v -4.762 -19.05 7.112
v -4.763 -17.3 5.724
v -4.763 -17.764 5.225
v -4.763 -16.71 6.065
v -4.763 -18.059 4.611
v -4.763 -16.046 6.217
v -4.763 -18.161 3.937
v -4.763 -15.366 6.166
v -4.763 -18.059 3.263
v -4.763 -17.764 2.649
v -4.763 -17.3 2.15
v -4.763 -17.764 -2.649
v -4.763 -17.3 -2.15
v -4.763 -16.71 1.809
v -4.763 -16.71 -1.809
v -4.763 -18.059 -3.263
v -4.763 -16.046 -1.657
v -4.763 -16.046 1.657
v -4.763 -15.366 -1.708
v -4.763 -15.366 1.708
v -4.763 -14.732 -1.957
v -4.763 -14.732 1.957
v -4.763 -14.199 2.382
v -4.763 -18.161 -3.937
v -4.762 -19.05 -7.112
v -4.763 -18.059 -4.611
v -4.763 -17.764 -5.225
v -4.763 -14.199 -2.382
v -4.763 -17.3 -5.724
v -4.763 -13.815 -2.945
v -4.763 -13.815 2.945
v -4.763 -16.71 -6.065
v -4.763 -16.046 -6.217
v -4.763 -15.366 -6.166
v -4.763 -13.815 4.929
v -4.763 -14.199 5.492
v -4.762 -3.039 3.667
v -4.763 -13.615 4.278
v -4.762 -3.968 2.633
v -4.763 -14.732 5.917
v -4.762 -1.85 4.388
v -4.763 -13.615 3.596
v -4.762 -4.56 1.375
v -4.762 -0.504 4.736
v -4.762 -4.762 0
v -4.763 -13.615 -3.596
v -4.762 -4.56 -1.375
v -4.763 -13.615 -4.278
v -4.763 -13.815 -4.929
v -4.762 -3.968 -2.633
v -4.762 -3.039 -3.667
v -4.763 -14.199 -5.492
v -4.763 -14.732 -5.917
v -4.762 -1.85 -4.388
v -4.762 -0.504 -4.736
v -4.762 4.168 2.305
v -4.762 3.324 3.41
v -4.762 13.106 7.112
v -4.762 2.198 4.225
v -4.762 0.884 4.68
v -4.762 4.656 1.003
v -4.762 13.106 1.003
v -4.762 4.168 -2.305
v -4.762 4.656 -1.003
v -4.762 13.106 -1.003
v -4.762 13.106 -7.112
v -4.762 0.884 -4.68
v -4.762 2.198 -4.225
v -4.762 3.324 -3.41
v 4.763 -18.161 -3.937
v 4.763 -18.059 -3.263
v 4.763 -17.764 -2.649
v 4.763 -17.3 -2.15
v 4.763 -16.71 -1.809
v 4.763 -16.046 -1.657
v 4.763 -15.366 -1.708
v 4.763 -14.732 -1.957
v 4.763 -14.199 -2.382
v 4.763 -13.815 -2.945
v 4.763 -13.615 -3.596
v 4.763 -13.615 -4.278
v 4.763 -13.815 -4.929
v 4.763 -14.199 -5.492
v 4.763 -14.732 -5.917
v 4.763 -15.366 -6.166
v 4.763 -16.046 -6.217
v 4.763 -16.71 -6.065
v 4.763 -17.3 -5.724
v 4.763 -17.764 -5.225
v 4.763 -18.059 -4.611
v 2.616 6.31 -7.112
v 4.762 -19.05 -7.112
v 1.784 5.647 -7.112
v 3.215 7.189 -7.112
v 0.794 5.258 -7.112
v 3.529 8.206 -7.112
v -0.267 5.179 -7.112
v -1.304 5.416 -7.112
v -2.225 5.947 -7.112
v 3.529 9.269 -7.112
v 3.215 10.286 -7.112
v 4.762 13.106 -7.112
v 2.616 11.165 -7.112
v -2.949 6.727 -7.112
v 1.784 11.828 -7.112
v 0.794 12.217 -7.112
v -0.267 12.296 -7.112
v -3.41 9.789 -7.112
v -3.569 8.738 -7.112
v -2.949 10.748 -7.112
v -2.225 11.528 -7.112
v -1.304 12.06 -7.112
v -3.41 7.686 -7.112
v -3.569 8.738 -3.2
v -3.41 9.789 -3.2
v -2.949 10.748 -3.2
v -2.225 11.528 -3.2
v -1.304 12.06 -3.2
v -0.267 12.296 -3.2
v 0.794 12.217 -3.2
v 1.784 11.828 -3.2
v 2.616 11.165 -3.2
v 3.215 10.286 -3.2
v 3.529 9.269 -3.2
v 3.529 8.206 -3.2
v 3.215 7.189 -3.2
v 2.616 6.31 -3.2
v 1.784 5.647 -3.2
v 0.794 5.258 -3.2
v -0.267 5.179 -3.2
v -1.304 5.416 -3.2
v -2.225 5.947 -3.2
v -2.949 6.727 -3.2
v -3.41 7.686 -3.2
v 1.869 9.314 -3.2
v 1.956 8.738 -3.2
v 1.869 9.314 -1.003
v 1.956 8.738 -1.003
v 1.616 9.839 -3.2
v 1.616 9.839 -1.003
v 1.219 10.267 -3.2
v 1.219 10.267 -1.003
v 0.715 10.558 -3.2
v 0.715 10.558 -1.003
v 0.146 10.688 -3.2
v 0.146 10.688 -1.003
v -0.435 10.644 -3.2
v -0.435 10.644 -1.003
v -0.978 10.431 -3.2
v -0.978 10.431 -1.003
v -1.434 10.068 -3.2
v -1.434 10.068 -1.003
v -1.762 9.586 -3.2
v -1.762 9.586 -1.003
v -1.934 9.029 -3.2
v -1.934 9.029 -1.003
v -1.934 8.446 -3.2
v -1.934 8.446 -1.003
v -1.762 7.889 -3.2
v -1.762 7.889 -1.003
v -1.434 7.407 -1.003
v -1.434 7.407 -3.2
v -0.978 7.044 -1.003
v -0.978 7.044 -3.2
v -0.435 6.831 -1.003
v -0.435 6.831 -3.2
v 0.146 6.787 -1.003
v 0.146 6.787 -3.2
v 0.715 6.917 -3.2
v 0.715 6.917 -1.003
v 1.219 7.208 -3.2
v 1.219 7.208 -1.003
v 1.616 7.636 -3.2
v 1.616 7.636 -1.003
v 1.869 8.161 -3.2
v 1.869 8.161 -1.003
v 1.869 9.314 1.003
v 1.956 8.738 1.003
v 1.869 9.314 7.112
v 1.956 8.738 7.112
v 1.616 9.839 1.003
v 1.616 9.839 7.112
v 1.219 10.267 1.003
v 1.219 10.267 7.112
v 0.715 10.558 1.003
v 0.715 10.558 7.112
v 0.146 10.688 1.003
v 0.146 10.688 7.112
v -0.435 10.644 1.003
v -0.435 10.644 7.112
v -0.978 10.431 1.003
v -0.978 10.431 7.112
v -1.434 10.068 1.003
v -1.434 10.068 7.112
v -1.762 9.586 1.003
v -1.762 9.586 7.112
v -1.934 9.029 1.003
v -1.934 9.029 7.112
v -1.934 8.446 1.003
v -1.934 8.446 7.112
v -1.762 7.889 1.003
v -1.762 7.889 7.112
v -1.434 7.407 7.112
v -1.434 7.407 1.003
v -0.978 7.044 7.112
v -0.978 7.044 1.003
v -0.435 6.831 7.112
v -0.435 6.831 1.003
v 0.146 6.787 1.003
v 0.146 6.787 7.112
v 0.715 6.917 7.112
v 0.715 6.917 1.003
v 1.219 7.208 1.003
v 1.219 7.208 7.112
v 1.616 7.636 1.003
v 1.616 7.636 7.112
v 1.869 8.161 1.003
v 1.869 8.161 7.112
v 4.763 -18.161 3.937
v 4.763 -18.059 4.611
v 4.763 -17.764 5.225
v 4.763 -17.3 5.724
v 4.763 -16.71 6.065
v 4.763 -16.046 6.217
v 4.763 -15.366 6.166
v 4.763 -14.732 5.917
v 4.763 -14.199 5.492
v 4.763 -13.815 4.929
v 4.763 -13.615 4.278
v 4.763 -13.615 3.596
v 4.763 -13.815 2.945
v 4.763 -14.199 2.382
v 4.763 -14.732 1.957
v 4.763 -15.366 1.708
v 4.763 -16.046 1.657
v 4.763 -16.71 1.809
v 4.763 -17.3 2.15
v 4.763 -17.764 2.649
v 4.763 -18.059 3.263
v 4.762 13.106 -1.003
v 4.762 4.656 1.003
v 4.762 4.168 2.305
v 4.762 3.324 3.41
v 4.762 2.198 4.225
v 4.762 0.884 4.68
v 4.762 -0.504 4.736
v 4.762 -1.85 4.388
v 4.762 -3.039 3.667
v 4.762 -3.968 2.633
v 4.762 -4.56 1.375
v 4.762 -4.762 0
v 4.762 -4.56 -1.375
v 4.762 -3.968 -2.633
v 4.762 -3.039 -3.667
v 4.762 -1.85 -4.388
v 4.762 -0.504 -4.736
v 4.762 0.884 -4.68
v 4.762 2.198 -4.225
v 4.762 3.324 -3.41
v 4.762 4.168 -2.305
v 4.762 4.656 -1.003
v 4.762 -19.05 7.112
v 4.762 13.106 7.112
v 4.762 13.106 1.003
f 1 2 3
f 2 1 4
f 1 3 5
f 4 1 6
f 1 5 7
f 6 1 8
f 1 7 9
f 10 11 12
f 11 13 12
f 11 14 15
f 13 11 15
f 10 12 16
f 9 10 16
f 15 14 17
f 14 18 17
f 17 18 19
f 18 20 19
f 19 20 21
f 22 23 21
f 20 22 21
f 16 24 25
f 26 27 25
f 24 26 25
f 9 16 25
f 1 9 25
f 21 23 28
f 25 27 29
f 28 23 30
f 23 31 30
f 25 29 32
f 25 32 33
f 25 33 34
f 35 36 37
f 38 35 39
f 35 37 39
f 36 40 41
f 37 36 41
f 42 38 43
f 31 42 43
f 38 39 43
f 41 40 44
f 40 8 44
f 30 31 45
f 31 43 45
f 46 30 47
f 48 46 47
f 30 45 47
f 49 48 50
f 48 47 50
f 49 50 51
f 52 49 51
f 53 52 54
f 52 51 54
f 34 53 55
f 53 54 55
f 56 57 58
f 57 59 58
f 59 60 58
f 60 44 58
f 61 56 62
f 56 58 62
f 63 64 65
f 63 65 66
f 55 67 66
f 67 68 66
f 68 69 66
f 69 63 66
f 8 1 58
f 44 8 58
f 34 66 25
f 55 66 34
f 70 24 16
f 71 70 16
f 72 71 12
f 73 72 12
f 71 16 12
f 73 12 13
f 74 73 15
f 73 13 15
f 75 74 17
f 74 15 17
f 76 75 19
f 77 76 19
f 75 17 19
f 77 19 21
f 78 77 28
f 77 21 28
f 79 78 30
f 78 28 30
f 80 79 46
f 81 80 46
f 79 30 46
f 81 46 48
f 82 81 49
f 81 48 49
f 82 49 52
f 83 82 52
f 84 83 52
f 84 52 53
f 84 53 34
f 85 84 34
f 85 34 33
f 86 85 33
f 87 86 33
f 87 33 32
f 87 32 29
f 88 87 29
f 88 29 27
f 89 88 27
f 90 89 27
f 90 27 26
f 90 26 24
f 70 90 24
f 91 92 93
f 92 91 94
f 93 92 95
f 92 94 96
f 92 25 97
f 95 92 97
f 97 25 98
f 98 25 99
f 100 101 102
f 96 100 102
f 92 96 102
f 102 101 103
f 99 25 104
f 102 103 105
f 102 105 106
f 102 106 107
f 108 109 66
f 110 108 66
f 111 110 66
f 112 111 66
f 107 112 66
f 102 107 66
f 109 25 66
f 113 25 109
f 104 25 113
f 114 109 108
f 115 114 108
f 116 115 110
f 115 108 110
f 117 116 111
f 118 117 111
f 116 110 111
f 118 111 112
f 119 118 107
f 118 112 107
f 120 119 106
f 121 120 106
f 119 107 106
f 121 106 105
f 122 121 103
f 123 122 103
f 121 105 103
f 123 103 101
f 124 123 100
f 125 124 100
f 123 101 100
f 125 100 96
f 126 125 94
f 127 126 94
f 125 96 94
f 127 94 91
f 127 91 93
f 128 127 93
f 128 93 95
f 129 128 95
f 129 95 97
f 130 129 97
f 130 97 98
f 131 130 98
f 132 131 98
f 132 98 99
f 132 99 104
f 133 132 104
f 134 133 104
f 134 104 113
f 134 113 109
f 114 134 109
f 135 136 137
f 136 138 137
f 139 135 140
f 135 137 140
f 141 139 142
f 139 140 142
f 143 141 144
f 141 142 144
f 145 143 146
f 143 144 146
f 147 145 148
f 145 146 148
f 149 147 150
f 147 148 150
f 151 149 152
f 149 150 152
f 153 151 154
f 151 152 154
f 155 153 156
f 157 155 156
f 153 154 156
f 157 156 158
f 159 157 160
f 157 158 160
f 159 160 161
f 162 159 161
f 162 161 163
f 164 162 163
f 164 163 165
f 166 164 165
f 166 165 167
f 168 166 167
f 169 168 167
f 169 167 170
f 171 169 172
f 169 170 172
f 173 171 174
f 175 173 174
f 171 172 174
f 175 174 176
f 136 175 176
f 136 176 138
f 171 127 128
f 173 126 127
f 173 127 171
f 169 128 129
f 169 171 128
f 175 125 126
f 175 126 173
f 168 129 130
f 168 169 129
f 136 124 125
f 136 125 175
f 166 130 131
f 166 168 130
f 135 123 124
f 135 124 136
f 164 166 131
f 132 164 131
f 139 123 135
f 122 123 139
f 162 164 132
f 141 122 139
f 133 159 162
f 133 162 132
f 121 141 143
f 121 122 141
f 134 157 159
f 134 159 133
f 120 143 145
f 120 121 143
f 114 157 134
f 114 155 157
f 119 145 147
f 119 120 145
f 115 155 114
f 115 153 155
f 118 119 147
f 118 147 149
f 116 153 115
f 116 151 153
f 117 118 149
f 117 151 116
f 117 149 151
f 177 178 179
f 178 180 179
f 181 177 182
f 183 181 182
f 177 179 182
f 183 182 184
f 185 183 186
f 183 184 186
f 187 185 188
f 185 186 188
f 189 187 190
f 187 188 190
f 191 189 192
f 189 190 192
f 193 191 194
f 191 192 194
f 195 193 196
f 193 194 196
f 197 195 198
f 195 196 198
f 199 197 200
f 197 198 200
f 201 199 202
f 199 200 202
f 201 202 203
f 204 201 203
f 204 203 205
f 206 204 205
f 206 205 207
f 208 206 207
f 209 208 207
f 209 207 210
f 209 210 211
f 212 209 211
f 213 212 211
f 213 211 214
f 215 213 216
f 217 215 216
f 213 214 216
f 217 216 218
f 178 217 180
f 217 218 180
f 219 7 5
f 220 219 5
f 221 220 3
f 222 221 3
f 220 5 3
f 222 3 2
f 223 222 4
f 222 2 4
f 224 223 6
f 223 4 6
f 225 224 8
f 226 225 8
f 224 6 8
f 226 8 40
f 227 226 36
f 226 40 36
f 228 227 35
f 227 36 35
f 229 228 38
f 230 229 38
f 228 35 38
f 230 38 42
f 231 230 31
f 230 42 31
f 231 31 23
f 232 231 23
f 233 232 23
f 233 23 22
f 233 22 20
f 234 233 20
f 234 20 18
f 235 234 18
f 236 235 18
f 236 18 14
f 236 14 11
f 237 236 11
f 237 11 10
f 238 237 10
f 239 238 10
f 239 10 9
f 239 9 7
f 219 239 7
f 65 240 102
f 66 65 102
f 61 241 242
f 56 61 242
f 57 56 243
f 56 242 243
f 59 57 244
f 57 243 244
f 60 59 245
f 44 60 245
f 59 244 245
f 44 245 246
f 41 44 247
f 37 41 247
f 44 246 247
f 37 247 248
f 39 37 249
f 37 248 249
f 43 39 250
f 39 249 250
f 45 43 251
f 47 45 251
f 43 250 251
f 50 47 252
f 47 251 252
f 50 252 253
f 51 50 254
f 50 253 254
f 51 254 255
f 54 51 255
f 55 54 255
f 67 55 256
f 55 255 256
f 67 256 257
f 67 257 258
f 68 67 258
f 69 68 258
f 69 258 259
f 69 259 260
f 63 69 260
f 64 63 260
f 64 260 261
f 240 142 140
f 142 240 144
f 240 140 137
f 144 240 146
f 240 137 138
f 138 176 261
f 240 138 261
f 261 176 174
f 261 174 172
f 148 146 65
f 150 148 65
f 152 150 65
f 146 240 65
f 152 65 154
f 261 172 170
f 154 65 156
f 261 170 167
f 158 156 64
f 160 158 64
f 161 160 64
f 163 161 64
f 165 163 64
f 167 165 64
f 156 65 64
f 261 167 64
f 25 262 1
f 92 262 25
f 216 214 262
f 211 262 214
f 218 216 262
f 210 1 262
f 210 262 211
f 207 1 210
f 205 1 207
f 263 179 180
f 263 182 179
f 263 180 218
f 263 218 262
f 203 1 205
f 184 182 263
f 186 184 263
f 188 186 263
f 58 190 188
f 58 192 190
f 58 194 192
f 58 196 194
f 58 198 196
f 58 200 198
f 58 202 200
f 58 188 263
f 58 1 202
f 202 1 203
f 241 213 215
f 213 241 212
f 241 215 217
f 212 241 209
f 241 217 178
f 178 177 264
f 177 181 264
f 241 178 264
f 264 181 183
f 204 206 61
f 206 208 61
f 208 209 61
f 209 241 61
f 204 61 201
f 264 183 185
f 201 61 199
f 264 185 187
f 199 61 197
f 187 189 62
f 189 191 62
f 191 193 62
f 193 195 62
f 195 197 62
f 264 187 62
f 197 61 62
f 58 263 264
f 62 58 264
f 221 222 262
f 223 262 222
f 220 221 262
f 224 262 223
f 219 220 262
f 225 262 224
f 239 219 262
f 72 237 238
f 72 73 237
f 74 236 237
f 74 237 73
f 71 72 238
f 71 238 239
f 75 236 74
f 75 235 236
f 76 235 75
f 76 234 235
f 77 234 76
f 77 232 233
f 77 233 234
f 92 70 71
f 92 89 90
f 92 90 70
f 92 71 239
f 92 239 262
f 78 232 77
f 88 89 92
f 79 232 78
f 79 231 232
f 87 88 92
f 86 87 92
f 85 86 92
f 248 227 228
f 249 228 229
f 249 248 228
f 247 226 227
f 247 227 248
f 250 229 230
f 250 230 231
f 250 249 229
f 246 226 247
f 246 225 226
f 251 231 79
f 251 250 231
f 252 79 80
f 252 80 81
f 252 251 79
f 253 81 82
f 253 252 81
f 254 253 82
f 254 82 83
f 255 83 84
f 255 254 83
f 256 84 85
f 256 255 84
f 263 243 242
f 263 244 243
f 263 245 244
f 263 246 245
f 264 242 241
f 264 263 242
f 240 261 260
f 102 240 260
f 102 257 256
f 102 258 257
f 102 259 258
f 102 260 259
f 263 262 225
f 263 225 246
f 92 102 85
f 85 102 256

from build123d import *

# Parameters (mm, degrees)
SKETCH1_W                                          = 31.75
SKETCH1_H                                          = 32.1564
BOSS_EXTRUDE1_DEPTH                                = 9.525
SKETCH2_W                                          = 8.763
SKETCH2_H                                          = 32.1564
CUT_EXTRUDE1_DEPTH                                 = 27.563955842
CUT_EXTRUDE2_DEPTH                                 = 27.563955842
SKETCH4_W                                          = 8.763
SKETCH4_H                                          = 32.16
CUT_EXTRUDE3_DEPTH                                 = 27.563955842
SKETCH5_W                                          = 9.525
SKETCH5_H                                          = 4.7625
SKETCH6_W                                          = 1.3208
SKETCH6_H                                          = 6.1087
CBORE_FOR_M3_5_HEX_HEAD_MACHINE_SCREW1_D           = 3.9116
CBORE_FOR_M3_5_HEX_HEAD_MACHINE_SCREW1_DEPTH       = 14.224
CBORE_FOR_M3_5_HEX_HEAD_MACHINE_SCREW1_CBORE_D     = 7.1374
CBORE_FOR_M3_5_HEX_HEAD_MACHINE_SCREW1_CBORE_DEPTH = 3.9116
M4_CLEARANCE_HOLE1_D                               = 4.572


with BuildPart() as part:
    # Sketch1 → Boss-Extrude1 (new body)
    with BuildSketch(Plane(origin=(4.7625, 0, 0), x_dir=(0, 0, -1), z_dir=(1, 0, 0))):
        with Locations((0, -2.9718)):
            Rectangle(SKETCH1_W, SKETCH1_H)
    extrude(amount=-BOSS_EXTRUDE1_DEPTH)

    # Sketch2 → Cut-Extrude1 (cut, through all)
    with BuildSketch(Plane.ZY.offset(4.7625)):
        with Locations((-11.4935, -2.9718)):
            Rectangle(SKETCH2_W, SKETCH2_H)
    extrude(amount=-CUT_EXTRUDE1_DEPTH, mode=Mode.SUBTRACT)

    # Sketch3 → Cut-Extrude2 (cut, through all)
    with BuildSketch(Plane.ZY.offset(4.7625)):
        with BuildLine():
            Line((1.0033, 13.1064), (-1.0033, 13.1064))
            Line((-1.0033, 13.1064), (-1.0033, 4.655619761))
            ThreePointArc((-1.0033, 4.655619761), (0, 4.7625), (1.0033, 4.655619761))
            Line((1.0033, 4.655619761), (1.0033, 13.1064))
        make_face()
    extrude(amount=-CUT_EXTRUDE2_DEPTH, mode=Mode.SUBTRACT)

    # Sketch4 → Cut-Extrude3 (cut, through all)
    with BuildSketch(Plane.ZY.offset(4.7625)):
        with Locations((11.4935, -2.9736)):
            Rectangle(SKETCH4_W, SKETCH4_H)
    extrude(amount=-CUT_EXTRUDE3_DEPTH, mode=Mode.SUBTRACT)

    # Sketch5 → Cut-Revolve1 (revolve, cut)
    with BuildSketch(Plane.XY):
        with Locations((0, 2.38125)):
            Rectangle(SKETCH5_W, SKETCH5_H)
    revolve(axis=Axis((-4.7625, 0, 0), (1, 0, 0)), mode=Mode.SUBTRACT)

    # Sketch6 → Hole1 (revolve, cut)
    with BuildSketch(Plane(origin=(0, 8.7376, 1.0033), x_dir=(0, 1, 0), z_dir=(1, 0, 0))):
        with Locations((0.6604, 3.05435)):
            Rectangle(SKETCH6_W, SKETCH6_H)
    revolve(axis=Axis((0, 8.7376, 111.0033), (0, 0, -1)), mode=Mode.SUBTRACT)

    # CBORE for M3.5 Hex Head Machine Screw1
    with Locations(Plane(origin=(0, 0, -7.112), x_dir=(-1, 0, 0), z_dir=(0, 0, -1))):
        with Locations((0, 8.7376)):
            CounterBoreHole(CBORE_FOR_M3_5_HEX_HEAD_MACHINE_SCREW1_D / 2, CBORE_FOR_M3_5_HEX_HEAD_MACHINE_SCREW1_CBORE_D / 2, CBORE_FOR_M3_5_HEX_HEAD_MACHINE_SCREW1_CBORE_DEPTH, depth=CBORE_FOR_M3_5_HEX_HEAD_MACHINE_SCREW1_DEPTH)

    # M4 Clearance Hole1 (through all)
    with Locations(Plane(origin=(4.7625, -17.4625, 0), x_dir=(0, 1, 0), z_dir=(1, 0, 0))):
        with Locations((1.5875, -3.937), (1.5875, 3.937)):
            Hole(M4_CLEARANCE_HOLE1_D / 2)


solid = part.part
